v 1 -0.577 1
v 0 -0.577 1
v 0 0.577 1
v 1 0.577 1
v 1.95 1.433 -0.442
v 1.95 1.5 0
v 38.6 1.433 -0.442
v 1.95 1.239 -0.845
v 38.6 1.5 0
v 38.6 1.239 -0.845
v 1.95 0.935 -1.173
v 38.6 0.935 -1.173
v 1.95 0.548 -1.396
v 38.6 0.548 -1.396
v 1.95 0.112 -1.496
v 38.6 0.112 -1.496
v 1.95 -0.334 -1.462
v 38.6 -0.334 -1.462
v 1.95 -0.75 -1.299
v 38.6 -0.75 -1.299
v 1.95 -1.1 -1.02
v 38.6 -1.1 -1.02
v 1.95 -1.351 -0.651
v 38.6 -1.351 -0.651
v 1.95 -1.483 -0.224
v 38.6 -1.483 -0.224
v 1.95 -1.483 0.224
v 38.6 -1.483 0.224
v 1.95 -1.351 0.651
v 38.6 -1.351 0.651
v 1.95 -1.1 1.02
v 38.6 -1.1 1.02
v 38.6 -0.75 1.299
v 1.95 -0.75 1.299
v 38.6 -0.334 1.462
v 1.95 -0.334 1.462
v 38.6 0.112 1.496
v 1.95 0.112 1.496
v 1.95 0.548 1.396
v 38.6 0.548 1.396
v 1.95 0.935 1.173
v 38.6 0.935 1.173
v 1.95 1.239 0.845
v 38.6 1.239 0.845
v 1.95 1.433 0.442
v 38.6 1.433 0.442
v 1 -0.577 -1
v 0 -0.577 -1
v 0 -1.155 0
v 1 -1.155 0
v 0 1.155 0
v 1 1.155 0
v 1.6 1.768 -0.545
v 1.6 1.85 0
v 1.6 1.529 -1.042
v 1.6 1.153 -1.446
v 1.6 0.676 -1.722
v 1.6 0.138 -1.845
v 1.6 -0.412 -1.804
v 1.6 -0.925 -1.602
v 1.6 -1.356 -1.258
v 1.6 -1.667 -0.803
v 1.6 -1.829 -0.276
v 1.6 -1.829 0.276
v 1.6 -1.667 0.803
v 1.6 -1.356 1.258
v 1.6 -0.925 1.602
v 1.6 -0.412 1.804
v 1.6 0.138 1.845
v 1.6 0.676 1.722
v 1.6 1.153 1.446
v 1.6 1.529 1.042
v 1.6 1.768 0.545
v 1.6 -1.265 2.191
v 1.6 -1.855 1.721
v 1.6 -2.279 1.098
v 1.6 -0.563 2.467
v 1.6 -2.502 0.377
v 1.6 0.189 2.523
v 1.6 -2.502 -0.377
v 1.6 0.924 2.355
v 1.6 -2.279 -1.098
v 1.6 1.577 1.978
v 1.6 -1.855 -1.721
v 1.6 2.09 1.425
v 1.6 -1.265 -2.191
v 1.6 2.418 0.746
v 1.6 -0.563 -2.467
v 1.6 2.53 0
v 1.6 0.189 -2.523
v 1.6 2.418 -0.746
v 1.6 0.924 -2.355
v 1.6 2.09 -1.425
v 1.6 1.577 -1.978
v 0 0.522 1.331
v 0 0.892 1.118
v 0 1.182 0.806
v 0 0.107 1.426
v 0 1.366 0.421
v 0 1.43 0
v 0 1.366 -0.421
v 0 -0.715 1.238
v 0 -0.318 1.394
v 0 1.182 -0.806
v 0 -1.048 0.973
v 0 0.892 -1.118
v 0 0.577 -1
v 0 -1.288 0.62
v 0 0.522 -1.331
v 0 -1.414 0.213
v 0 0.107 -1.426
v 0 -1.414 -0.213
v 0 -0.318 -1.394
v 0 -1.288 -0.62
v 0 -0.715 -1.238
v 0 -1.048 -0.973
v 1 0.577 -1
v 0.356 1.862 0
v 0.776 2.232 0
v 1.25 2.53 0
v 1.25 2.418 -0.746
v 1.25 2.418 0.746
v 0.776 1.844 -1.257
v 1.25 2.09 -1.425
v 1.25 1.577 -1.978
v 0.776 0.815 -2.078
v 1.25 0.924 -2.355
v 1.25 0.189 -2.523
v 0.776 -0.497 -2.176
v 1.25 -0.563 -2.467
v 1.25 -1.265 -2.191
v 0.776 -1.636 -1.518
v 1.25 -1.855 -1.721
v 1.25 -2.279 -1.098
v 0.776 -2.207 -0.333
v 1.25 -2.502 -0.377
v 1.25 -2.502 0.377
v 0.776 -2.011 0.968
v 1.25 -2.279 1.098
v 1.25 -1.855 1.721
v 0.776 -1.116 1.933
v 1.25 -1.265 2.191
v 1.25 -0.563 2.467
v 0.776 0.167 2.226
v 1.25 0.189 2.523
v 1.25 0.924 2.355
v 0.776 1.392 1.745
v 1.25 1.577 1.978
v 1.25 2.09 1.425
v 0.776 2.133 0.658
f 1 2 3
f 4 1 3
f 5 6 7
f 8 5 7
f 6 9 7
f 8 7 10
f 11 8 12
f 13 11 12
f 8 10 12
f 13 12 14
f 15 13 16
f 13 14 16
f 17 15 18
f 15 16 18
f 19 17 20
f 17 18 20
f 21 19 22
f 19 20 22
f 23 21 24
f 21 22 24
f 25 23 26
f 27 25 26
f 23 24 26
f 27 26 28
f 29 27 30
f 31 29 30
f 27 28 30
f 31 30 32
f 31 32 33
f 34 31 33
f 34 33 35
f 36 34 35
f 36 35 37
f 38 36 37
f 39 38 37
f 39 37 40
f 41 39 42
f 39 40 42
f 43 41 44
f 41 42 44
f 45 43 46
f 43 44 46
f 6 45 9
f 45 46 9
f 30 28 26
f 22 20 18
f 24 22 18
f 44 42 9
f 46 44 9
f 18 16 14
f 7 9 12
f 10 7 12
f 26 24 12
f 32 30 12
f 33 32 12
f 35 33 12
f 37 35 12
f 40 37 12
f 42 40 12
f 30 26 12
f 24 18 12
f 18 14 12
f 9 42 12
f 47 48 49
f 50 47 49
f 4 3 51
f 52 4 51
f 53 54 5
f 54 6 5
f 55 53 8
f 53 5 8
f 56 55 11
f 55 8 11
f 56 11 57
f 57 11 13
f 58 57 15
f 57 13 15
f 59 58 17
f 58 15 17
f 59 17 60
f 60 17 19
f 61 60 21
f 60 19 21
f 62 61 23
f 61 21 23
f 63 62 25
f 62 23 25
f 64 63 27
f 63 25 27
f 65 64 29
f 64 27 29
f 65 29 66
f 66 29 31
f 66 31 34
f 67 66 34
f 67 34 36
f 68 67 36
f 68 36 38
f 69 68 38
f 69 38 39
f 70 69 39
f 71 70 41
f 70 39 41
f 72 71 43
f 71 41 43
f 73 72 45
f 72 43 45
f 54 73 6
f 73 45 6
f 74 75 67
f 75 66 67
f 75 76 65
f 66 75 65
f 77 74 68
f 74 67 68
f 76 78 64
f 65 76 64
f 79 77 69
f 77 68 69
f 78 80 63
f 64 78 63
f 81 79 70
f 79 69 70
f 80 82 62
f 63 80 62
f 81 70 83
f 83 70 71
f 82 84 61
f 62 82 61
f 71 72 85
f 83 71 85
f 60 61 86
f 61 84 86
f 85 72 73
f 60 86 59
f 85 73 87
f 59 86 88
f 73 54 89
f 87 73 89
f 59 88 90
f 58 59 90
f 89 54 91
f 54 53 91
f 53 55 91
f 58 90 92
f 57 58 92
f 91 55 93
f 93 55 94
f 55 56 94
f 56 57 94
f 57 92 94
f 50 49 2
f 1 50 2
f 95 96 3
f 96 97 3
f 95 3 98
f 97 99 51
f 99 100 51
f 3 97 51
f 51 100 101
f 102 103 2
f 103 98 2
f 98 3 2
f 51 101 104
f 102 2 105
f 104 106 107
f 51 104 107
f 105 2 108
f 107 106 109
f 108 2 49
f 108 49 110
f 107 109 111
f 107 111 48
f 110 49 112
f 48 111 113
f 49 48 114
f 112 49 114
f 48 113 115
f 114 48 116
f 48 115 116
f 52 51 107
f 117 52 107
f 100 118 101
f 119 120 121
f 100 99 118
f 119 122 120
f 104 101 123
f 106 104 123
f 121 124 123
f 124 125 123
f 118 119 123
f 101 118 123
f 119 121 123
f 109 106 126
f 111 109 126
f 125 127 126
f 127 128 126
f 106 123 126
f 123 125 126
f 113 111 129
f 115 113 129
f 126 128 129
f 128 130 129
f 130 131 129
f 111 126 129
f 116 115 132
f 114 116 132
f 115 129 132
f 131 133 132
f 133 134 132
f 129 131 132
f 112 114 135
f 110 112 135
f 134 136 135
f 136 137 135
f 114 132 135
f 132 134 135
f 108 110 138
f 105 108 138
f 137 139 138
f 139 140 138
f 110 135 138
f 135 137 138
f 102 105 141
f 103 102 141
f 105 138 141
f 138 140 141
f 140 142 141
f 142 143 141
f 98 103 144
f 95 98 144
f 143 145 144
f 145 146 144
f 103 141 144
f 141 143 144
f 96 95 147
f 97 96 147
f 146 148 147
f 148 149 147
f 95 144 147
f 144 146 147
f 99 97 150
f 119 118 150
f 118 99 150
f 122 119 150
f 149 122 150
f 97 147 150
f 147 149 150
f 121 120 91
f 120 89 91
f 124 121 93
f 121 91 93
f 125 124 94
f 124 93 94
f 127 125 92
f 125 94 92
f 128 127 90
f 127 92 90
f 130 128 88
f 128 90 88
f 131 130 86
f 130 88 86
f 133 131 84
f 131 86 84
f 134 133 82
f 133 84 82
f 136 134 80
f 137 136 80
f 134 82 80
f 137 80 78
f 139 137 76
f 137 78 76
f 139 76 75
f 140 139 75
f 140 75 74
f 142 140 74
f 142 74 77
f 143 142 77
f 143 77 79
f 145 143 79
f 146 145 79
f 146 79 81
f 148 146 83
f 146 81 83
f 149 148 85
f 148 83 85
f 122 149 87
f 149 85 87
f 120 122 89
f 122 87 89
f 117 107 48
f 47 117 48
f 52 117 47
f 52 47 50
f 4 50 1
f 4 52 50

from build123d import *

# Parameters (mm, degrees)
CUT_EXTRUDE1_DEPTH = 1


with BuildPart() as part:
    # Sketch2 → Revolve1 (revolve)
    with BuildSketch(Plane.XY):
        with BuildLine():
            Line((0, 0), (0, 1.43))
            ThreePointArc((0, 1.43), (0.558633593, 2.055416372), (1.25, 2.53))
            Line((1.25, 2.53), (1.6, 2.53))
            Line((1.6, 2.53), (1.6, 1.85))
            Line((1.6, 1.85), (1.95, 1.5))
            Line((1.95, 1.5), (38.6, 1.5))
            Line((38.6, 1.5), (38.6, 0))
            Line((38.6, 0), (0, 0))
        make_face()
    revolve(axis=Axis((38.6, 0, 0), (-1, 0, 0)))

    # Sketch3 → Cut-Extrude1 (cut)
    with BuildSketch(Plane.ZY):
        Polygon((0, 1.154700538), (-1, 0.577350269), (-1, -0.577350269), (0, -1.154700538), (1, -0.577350269), (1, 0.577350269), align=None)
    extrude(amount=-CUT_EXTRUDE1_DEPTH, mode=Mode.SUBTRACT)


solid = part.part
